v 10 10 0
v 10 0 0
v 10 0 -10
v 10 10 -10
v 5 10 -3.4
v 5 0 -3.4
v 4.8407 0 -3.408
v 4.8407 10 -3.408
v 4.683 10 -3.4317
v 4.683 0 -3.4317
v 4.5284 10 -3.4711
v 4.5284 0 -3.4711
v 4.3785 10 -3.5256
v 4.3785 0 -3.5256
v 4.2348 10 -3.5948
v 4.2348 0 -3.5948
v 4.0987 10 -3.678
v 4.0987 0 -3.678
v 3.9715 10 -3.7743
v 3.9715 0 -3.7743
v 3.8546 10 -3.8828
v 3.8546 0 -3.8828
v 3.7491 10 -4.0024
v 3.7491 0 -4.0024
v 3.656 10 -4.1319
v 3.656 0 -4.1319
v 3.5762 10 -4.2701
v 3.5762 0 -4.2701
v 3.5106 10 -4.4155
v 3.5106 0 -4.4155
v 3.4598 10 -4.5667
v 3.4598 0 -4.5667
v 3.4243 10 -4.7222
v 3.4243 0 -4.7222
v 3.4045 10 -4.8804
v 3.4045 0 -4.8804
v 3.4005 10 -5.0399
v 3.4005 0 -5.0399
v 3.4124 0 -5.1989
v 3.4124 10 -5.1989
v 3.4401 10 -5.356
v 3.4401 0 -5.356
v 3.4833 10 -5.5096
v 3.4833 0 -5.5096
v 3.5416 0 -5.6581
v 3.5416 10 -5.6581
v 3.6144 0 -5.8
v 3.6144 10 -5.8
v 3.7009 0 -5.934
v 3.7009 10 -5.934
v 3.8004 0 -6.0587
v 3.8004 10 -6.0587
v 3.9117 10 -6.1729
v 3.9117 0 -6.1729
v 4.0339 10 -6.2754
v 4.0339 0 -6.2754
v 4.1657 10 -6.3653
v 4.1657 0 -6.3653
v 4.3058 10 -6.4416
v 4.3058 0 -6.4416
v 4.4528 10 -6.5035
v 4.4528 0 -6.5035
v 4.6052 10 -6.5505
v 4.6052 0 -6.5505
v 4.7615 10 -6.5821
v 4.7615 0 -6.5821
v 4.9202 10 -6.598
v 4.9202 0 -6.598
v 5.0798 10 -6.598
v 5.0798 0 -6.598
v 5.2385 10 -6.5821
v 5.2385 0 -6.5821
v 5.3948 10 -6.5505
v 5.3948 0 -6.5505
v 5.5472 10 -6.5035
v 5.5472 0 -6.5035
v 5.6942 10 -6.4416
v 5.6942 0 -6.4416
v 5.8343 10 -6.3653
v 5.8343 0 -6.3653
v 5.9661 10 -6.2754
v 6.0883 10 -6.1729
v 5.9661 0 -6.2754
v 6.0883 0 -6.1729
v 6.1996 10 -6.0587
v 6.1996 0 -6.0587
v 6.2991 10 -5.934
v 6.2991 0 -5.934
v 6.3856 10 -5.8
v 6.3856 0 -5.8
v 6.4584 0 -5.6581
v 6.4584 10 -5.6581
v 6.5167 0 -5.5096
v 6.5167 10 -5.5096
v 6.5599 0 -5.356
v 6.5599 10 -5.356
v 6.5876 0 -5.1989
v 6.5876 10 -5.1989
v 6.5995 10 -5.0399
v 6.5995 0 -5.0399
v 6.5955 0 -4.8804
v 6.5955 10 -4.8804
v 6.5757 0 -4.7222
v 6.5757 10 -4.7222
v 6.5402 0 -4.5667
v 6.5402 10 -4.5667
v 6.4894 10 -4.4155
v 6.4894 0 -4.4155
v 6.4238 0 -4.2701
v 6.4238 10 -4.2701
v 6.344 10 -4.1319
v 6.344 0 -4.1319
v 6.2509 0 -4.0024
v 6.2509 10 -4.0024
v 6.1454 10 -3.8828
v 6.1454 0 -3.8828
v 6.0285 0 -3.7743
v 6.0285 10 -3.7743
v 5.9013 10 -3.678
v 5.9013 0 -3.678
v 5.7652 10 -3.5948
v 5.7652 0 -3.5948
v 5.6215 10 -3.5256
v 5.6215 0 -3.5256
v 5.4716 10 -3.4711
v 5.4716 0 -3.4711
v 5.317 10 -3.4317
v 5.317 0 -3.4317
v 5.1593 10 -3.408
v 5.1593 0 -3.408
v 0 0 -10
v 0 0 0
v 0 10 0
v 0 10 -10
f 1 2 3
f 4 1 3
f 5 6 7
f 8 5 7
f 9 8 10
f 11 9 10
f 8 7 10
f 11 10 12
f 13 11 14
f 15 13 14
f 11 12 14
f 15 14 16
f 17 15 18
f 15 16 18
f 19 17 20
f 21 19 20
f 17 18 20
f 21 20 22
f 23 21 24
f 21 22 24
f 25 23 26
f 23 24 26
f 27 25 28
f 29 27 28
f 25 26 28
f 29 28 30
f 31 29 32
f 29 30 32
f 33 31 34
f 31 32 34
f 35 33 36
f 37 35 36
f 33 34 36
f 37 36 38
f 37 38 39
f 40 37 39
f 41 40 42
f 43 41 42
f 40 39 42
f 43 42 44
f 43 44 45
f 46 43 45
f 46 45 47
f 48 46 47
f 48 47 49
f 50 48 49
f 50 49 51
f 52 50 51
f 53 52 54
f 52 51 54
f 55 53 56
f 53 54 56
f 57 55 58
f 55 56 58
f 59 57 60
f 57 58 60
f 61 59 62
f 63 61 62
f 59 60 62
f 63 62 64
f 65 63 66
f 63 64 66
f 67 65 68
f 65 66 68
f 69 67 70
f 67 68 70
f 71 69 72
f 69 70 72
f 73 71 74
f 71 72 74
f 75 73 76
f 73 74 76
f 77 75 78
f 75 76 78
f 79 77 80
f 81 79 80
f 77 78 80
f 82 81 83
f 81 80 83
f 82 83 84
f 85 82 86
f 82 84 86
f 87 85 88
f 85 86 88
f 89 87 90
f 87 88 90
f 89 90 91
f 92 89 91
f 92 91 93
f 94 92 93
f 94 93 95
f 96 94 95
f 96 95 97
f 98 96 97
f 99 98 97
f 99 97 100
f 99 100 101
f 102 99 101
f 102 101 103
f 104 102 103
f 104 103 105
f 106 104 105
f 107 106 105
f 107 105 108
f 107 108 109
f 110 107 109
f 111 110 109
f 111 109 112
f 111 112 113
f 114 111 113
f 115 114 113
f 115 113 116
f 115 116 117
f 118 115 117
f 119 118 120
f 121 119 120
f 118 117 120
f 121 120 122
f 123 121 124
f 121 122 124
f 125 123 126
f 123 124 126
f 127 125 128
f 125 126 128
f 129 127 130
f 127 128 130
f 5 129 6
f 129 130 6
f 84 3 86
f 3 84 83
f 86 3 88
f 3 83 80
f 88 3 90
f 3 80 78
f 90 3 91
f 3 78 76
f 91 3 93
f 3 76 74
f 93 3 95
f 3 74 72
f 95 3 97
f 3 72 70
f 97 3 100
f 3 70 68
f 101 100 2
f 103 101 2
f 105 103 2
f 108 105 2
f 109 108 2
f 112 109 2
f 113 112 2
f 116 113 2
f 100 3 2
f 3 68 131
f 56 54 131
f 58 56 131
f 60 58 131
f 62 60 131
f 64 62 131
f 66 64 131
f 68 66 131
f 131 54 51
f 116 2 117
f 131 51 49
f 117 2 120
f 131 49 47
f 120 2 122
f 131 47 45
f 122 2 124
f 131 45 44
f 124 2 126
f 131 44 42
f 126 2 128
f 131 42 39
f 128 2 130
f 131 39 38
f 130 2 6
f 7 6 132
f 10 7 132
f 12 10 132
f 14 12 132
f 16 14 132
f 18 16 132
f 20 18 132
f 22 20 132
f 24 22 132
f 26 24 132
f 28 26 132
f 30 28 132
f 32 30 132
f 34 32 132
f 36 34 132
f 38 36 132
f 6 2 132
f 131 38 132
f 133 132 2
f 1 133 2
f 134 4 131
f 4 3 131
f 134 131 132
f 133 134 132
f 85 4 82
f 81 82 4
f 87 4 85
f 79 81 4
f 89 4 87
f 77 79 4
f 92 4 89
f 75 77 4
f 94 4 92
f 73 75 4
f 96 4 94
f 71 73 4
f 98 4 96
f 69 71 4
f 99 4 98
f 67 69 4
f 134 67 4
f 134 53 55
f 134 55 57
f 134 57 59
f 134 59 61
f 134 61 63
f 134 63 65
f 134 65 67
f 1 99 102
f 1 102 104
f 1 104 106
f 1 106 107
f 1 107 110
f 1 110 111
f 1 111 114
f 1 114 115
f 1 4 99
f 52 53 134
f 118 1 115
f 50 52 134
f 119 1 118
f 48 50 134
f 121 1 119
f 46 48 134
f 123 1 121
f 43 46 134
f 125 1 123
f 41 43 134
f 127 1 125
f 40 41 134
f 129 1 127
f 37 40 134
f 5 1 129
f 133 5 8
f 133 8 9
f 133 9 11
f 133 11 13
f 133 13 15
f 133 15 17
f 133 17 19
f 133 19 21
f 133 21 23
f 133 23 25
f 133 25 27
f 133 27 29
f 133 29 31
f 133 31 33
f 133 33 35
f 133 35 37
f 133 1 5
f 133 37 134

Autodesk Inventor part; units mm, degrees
ref_plane "YZ Plane" through (0, 0, 0) normal (1, 0, 0) x (0, 1, 0)
ref_plane "XZ Plane" through (0, 0, 0) normal (0, 1, 0) x (-1, 0, 0)
ref_plane "XY Plane" through (0, 0, 0) normal (0, 0, 1) x (1, 0, 0)
sketch "Sketch1" plane through (0, 0, 0) normal (0, 1, 0) x (-1, 0, 0)
  line L0 (0, 0) -> (-10, 0)
  line L1 (-10, 0) -> (-10, -10)
  line L2 (-10, -10) -> (0, -10)
  line L3 (0, -10) -> (0, 0)
  dimension "d0" = 10
  dimension "d1" = 10
extrude "Extrusion1" add sketch "Sketch1" along normal blind 10
sketch "Sketch2" plane through (0, 10, 0) normal (0, 1, 0) x (1, 0, 0)
  line L0 (0, 10) -> (0, 0) projected
  line L1 (10, 0) -> (10, 10) projected
  line L2 (0, 0) -> (10, 10)
  line L3 (10, 10) -> (0, 10) projected
  line L4 (10, 0) -> (0, 10)
  line L5 (5, 5) -> (7.1771, 5)
sketch "Sketch3" plane through (0, 10, 0) normal (0, 1, 0) x (1, 0, 0)
  point P0 (0, 0)
hole "Hole1" at (5, 10, -5) direction (0, -1, 0) diameter 3.2 end through all
properties part number "distanziale cella di carico"
